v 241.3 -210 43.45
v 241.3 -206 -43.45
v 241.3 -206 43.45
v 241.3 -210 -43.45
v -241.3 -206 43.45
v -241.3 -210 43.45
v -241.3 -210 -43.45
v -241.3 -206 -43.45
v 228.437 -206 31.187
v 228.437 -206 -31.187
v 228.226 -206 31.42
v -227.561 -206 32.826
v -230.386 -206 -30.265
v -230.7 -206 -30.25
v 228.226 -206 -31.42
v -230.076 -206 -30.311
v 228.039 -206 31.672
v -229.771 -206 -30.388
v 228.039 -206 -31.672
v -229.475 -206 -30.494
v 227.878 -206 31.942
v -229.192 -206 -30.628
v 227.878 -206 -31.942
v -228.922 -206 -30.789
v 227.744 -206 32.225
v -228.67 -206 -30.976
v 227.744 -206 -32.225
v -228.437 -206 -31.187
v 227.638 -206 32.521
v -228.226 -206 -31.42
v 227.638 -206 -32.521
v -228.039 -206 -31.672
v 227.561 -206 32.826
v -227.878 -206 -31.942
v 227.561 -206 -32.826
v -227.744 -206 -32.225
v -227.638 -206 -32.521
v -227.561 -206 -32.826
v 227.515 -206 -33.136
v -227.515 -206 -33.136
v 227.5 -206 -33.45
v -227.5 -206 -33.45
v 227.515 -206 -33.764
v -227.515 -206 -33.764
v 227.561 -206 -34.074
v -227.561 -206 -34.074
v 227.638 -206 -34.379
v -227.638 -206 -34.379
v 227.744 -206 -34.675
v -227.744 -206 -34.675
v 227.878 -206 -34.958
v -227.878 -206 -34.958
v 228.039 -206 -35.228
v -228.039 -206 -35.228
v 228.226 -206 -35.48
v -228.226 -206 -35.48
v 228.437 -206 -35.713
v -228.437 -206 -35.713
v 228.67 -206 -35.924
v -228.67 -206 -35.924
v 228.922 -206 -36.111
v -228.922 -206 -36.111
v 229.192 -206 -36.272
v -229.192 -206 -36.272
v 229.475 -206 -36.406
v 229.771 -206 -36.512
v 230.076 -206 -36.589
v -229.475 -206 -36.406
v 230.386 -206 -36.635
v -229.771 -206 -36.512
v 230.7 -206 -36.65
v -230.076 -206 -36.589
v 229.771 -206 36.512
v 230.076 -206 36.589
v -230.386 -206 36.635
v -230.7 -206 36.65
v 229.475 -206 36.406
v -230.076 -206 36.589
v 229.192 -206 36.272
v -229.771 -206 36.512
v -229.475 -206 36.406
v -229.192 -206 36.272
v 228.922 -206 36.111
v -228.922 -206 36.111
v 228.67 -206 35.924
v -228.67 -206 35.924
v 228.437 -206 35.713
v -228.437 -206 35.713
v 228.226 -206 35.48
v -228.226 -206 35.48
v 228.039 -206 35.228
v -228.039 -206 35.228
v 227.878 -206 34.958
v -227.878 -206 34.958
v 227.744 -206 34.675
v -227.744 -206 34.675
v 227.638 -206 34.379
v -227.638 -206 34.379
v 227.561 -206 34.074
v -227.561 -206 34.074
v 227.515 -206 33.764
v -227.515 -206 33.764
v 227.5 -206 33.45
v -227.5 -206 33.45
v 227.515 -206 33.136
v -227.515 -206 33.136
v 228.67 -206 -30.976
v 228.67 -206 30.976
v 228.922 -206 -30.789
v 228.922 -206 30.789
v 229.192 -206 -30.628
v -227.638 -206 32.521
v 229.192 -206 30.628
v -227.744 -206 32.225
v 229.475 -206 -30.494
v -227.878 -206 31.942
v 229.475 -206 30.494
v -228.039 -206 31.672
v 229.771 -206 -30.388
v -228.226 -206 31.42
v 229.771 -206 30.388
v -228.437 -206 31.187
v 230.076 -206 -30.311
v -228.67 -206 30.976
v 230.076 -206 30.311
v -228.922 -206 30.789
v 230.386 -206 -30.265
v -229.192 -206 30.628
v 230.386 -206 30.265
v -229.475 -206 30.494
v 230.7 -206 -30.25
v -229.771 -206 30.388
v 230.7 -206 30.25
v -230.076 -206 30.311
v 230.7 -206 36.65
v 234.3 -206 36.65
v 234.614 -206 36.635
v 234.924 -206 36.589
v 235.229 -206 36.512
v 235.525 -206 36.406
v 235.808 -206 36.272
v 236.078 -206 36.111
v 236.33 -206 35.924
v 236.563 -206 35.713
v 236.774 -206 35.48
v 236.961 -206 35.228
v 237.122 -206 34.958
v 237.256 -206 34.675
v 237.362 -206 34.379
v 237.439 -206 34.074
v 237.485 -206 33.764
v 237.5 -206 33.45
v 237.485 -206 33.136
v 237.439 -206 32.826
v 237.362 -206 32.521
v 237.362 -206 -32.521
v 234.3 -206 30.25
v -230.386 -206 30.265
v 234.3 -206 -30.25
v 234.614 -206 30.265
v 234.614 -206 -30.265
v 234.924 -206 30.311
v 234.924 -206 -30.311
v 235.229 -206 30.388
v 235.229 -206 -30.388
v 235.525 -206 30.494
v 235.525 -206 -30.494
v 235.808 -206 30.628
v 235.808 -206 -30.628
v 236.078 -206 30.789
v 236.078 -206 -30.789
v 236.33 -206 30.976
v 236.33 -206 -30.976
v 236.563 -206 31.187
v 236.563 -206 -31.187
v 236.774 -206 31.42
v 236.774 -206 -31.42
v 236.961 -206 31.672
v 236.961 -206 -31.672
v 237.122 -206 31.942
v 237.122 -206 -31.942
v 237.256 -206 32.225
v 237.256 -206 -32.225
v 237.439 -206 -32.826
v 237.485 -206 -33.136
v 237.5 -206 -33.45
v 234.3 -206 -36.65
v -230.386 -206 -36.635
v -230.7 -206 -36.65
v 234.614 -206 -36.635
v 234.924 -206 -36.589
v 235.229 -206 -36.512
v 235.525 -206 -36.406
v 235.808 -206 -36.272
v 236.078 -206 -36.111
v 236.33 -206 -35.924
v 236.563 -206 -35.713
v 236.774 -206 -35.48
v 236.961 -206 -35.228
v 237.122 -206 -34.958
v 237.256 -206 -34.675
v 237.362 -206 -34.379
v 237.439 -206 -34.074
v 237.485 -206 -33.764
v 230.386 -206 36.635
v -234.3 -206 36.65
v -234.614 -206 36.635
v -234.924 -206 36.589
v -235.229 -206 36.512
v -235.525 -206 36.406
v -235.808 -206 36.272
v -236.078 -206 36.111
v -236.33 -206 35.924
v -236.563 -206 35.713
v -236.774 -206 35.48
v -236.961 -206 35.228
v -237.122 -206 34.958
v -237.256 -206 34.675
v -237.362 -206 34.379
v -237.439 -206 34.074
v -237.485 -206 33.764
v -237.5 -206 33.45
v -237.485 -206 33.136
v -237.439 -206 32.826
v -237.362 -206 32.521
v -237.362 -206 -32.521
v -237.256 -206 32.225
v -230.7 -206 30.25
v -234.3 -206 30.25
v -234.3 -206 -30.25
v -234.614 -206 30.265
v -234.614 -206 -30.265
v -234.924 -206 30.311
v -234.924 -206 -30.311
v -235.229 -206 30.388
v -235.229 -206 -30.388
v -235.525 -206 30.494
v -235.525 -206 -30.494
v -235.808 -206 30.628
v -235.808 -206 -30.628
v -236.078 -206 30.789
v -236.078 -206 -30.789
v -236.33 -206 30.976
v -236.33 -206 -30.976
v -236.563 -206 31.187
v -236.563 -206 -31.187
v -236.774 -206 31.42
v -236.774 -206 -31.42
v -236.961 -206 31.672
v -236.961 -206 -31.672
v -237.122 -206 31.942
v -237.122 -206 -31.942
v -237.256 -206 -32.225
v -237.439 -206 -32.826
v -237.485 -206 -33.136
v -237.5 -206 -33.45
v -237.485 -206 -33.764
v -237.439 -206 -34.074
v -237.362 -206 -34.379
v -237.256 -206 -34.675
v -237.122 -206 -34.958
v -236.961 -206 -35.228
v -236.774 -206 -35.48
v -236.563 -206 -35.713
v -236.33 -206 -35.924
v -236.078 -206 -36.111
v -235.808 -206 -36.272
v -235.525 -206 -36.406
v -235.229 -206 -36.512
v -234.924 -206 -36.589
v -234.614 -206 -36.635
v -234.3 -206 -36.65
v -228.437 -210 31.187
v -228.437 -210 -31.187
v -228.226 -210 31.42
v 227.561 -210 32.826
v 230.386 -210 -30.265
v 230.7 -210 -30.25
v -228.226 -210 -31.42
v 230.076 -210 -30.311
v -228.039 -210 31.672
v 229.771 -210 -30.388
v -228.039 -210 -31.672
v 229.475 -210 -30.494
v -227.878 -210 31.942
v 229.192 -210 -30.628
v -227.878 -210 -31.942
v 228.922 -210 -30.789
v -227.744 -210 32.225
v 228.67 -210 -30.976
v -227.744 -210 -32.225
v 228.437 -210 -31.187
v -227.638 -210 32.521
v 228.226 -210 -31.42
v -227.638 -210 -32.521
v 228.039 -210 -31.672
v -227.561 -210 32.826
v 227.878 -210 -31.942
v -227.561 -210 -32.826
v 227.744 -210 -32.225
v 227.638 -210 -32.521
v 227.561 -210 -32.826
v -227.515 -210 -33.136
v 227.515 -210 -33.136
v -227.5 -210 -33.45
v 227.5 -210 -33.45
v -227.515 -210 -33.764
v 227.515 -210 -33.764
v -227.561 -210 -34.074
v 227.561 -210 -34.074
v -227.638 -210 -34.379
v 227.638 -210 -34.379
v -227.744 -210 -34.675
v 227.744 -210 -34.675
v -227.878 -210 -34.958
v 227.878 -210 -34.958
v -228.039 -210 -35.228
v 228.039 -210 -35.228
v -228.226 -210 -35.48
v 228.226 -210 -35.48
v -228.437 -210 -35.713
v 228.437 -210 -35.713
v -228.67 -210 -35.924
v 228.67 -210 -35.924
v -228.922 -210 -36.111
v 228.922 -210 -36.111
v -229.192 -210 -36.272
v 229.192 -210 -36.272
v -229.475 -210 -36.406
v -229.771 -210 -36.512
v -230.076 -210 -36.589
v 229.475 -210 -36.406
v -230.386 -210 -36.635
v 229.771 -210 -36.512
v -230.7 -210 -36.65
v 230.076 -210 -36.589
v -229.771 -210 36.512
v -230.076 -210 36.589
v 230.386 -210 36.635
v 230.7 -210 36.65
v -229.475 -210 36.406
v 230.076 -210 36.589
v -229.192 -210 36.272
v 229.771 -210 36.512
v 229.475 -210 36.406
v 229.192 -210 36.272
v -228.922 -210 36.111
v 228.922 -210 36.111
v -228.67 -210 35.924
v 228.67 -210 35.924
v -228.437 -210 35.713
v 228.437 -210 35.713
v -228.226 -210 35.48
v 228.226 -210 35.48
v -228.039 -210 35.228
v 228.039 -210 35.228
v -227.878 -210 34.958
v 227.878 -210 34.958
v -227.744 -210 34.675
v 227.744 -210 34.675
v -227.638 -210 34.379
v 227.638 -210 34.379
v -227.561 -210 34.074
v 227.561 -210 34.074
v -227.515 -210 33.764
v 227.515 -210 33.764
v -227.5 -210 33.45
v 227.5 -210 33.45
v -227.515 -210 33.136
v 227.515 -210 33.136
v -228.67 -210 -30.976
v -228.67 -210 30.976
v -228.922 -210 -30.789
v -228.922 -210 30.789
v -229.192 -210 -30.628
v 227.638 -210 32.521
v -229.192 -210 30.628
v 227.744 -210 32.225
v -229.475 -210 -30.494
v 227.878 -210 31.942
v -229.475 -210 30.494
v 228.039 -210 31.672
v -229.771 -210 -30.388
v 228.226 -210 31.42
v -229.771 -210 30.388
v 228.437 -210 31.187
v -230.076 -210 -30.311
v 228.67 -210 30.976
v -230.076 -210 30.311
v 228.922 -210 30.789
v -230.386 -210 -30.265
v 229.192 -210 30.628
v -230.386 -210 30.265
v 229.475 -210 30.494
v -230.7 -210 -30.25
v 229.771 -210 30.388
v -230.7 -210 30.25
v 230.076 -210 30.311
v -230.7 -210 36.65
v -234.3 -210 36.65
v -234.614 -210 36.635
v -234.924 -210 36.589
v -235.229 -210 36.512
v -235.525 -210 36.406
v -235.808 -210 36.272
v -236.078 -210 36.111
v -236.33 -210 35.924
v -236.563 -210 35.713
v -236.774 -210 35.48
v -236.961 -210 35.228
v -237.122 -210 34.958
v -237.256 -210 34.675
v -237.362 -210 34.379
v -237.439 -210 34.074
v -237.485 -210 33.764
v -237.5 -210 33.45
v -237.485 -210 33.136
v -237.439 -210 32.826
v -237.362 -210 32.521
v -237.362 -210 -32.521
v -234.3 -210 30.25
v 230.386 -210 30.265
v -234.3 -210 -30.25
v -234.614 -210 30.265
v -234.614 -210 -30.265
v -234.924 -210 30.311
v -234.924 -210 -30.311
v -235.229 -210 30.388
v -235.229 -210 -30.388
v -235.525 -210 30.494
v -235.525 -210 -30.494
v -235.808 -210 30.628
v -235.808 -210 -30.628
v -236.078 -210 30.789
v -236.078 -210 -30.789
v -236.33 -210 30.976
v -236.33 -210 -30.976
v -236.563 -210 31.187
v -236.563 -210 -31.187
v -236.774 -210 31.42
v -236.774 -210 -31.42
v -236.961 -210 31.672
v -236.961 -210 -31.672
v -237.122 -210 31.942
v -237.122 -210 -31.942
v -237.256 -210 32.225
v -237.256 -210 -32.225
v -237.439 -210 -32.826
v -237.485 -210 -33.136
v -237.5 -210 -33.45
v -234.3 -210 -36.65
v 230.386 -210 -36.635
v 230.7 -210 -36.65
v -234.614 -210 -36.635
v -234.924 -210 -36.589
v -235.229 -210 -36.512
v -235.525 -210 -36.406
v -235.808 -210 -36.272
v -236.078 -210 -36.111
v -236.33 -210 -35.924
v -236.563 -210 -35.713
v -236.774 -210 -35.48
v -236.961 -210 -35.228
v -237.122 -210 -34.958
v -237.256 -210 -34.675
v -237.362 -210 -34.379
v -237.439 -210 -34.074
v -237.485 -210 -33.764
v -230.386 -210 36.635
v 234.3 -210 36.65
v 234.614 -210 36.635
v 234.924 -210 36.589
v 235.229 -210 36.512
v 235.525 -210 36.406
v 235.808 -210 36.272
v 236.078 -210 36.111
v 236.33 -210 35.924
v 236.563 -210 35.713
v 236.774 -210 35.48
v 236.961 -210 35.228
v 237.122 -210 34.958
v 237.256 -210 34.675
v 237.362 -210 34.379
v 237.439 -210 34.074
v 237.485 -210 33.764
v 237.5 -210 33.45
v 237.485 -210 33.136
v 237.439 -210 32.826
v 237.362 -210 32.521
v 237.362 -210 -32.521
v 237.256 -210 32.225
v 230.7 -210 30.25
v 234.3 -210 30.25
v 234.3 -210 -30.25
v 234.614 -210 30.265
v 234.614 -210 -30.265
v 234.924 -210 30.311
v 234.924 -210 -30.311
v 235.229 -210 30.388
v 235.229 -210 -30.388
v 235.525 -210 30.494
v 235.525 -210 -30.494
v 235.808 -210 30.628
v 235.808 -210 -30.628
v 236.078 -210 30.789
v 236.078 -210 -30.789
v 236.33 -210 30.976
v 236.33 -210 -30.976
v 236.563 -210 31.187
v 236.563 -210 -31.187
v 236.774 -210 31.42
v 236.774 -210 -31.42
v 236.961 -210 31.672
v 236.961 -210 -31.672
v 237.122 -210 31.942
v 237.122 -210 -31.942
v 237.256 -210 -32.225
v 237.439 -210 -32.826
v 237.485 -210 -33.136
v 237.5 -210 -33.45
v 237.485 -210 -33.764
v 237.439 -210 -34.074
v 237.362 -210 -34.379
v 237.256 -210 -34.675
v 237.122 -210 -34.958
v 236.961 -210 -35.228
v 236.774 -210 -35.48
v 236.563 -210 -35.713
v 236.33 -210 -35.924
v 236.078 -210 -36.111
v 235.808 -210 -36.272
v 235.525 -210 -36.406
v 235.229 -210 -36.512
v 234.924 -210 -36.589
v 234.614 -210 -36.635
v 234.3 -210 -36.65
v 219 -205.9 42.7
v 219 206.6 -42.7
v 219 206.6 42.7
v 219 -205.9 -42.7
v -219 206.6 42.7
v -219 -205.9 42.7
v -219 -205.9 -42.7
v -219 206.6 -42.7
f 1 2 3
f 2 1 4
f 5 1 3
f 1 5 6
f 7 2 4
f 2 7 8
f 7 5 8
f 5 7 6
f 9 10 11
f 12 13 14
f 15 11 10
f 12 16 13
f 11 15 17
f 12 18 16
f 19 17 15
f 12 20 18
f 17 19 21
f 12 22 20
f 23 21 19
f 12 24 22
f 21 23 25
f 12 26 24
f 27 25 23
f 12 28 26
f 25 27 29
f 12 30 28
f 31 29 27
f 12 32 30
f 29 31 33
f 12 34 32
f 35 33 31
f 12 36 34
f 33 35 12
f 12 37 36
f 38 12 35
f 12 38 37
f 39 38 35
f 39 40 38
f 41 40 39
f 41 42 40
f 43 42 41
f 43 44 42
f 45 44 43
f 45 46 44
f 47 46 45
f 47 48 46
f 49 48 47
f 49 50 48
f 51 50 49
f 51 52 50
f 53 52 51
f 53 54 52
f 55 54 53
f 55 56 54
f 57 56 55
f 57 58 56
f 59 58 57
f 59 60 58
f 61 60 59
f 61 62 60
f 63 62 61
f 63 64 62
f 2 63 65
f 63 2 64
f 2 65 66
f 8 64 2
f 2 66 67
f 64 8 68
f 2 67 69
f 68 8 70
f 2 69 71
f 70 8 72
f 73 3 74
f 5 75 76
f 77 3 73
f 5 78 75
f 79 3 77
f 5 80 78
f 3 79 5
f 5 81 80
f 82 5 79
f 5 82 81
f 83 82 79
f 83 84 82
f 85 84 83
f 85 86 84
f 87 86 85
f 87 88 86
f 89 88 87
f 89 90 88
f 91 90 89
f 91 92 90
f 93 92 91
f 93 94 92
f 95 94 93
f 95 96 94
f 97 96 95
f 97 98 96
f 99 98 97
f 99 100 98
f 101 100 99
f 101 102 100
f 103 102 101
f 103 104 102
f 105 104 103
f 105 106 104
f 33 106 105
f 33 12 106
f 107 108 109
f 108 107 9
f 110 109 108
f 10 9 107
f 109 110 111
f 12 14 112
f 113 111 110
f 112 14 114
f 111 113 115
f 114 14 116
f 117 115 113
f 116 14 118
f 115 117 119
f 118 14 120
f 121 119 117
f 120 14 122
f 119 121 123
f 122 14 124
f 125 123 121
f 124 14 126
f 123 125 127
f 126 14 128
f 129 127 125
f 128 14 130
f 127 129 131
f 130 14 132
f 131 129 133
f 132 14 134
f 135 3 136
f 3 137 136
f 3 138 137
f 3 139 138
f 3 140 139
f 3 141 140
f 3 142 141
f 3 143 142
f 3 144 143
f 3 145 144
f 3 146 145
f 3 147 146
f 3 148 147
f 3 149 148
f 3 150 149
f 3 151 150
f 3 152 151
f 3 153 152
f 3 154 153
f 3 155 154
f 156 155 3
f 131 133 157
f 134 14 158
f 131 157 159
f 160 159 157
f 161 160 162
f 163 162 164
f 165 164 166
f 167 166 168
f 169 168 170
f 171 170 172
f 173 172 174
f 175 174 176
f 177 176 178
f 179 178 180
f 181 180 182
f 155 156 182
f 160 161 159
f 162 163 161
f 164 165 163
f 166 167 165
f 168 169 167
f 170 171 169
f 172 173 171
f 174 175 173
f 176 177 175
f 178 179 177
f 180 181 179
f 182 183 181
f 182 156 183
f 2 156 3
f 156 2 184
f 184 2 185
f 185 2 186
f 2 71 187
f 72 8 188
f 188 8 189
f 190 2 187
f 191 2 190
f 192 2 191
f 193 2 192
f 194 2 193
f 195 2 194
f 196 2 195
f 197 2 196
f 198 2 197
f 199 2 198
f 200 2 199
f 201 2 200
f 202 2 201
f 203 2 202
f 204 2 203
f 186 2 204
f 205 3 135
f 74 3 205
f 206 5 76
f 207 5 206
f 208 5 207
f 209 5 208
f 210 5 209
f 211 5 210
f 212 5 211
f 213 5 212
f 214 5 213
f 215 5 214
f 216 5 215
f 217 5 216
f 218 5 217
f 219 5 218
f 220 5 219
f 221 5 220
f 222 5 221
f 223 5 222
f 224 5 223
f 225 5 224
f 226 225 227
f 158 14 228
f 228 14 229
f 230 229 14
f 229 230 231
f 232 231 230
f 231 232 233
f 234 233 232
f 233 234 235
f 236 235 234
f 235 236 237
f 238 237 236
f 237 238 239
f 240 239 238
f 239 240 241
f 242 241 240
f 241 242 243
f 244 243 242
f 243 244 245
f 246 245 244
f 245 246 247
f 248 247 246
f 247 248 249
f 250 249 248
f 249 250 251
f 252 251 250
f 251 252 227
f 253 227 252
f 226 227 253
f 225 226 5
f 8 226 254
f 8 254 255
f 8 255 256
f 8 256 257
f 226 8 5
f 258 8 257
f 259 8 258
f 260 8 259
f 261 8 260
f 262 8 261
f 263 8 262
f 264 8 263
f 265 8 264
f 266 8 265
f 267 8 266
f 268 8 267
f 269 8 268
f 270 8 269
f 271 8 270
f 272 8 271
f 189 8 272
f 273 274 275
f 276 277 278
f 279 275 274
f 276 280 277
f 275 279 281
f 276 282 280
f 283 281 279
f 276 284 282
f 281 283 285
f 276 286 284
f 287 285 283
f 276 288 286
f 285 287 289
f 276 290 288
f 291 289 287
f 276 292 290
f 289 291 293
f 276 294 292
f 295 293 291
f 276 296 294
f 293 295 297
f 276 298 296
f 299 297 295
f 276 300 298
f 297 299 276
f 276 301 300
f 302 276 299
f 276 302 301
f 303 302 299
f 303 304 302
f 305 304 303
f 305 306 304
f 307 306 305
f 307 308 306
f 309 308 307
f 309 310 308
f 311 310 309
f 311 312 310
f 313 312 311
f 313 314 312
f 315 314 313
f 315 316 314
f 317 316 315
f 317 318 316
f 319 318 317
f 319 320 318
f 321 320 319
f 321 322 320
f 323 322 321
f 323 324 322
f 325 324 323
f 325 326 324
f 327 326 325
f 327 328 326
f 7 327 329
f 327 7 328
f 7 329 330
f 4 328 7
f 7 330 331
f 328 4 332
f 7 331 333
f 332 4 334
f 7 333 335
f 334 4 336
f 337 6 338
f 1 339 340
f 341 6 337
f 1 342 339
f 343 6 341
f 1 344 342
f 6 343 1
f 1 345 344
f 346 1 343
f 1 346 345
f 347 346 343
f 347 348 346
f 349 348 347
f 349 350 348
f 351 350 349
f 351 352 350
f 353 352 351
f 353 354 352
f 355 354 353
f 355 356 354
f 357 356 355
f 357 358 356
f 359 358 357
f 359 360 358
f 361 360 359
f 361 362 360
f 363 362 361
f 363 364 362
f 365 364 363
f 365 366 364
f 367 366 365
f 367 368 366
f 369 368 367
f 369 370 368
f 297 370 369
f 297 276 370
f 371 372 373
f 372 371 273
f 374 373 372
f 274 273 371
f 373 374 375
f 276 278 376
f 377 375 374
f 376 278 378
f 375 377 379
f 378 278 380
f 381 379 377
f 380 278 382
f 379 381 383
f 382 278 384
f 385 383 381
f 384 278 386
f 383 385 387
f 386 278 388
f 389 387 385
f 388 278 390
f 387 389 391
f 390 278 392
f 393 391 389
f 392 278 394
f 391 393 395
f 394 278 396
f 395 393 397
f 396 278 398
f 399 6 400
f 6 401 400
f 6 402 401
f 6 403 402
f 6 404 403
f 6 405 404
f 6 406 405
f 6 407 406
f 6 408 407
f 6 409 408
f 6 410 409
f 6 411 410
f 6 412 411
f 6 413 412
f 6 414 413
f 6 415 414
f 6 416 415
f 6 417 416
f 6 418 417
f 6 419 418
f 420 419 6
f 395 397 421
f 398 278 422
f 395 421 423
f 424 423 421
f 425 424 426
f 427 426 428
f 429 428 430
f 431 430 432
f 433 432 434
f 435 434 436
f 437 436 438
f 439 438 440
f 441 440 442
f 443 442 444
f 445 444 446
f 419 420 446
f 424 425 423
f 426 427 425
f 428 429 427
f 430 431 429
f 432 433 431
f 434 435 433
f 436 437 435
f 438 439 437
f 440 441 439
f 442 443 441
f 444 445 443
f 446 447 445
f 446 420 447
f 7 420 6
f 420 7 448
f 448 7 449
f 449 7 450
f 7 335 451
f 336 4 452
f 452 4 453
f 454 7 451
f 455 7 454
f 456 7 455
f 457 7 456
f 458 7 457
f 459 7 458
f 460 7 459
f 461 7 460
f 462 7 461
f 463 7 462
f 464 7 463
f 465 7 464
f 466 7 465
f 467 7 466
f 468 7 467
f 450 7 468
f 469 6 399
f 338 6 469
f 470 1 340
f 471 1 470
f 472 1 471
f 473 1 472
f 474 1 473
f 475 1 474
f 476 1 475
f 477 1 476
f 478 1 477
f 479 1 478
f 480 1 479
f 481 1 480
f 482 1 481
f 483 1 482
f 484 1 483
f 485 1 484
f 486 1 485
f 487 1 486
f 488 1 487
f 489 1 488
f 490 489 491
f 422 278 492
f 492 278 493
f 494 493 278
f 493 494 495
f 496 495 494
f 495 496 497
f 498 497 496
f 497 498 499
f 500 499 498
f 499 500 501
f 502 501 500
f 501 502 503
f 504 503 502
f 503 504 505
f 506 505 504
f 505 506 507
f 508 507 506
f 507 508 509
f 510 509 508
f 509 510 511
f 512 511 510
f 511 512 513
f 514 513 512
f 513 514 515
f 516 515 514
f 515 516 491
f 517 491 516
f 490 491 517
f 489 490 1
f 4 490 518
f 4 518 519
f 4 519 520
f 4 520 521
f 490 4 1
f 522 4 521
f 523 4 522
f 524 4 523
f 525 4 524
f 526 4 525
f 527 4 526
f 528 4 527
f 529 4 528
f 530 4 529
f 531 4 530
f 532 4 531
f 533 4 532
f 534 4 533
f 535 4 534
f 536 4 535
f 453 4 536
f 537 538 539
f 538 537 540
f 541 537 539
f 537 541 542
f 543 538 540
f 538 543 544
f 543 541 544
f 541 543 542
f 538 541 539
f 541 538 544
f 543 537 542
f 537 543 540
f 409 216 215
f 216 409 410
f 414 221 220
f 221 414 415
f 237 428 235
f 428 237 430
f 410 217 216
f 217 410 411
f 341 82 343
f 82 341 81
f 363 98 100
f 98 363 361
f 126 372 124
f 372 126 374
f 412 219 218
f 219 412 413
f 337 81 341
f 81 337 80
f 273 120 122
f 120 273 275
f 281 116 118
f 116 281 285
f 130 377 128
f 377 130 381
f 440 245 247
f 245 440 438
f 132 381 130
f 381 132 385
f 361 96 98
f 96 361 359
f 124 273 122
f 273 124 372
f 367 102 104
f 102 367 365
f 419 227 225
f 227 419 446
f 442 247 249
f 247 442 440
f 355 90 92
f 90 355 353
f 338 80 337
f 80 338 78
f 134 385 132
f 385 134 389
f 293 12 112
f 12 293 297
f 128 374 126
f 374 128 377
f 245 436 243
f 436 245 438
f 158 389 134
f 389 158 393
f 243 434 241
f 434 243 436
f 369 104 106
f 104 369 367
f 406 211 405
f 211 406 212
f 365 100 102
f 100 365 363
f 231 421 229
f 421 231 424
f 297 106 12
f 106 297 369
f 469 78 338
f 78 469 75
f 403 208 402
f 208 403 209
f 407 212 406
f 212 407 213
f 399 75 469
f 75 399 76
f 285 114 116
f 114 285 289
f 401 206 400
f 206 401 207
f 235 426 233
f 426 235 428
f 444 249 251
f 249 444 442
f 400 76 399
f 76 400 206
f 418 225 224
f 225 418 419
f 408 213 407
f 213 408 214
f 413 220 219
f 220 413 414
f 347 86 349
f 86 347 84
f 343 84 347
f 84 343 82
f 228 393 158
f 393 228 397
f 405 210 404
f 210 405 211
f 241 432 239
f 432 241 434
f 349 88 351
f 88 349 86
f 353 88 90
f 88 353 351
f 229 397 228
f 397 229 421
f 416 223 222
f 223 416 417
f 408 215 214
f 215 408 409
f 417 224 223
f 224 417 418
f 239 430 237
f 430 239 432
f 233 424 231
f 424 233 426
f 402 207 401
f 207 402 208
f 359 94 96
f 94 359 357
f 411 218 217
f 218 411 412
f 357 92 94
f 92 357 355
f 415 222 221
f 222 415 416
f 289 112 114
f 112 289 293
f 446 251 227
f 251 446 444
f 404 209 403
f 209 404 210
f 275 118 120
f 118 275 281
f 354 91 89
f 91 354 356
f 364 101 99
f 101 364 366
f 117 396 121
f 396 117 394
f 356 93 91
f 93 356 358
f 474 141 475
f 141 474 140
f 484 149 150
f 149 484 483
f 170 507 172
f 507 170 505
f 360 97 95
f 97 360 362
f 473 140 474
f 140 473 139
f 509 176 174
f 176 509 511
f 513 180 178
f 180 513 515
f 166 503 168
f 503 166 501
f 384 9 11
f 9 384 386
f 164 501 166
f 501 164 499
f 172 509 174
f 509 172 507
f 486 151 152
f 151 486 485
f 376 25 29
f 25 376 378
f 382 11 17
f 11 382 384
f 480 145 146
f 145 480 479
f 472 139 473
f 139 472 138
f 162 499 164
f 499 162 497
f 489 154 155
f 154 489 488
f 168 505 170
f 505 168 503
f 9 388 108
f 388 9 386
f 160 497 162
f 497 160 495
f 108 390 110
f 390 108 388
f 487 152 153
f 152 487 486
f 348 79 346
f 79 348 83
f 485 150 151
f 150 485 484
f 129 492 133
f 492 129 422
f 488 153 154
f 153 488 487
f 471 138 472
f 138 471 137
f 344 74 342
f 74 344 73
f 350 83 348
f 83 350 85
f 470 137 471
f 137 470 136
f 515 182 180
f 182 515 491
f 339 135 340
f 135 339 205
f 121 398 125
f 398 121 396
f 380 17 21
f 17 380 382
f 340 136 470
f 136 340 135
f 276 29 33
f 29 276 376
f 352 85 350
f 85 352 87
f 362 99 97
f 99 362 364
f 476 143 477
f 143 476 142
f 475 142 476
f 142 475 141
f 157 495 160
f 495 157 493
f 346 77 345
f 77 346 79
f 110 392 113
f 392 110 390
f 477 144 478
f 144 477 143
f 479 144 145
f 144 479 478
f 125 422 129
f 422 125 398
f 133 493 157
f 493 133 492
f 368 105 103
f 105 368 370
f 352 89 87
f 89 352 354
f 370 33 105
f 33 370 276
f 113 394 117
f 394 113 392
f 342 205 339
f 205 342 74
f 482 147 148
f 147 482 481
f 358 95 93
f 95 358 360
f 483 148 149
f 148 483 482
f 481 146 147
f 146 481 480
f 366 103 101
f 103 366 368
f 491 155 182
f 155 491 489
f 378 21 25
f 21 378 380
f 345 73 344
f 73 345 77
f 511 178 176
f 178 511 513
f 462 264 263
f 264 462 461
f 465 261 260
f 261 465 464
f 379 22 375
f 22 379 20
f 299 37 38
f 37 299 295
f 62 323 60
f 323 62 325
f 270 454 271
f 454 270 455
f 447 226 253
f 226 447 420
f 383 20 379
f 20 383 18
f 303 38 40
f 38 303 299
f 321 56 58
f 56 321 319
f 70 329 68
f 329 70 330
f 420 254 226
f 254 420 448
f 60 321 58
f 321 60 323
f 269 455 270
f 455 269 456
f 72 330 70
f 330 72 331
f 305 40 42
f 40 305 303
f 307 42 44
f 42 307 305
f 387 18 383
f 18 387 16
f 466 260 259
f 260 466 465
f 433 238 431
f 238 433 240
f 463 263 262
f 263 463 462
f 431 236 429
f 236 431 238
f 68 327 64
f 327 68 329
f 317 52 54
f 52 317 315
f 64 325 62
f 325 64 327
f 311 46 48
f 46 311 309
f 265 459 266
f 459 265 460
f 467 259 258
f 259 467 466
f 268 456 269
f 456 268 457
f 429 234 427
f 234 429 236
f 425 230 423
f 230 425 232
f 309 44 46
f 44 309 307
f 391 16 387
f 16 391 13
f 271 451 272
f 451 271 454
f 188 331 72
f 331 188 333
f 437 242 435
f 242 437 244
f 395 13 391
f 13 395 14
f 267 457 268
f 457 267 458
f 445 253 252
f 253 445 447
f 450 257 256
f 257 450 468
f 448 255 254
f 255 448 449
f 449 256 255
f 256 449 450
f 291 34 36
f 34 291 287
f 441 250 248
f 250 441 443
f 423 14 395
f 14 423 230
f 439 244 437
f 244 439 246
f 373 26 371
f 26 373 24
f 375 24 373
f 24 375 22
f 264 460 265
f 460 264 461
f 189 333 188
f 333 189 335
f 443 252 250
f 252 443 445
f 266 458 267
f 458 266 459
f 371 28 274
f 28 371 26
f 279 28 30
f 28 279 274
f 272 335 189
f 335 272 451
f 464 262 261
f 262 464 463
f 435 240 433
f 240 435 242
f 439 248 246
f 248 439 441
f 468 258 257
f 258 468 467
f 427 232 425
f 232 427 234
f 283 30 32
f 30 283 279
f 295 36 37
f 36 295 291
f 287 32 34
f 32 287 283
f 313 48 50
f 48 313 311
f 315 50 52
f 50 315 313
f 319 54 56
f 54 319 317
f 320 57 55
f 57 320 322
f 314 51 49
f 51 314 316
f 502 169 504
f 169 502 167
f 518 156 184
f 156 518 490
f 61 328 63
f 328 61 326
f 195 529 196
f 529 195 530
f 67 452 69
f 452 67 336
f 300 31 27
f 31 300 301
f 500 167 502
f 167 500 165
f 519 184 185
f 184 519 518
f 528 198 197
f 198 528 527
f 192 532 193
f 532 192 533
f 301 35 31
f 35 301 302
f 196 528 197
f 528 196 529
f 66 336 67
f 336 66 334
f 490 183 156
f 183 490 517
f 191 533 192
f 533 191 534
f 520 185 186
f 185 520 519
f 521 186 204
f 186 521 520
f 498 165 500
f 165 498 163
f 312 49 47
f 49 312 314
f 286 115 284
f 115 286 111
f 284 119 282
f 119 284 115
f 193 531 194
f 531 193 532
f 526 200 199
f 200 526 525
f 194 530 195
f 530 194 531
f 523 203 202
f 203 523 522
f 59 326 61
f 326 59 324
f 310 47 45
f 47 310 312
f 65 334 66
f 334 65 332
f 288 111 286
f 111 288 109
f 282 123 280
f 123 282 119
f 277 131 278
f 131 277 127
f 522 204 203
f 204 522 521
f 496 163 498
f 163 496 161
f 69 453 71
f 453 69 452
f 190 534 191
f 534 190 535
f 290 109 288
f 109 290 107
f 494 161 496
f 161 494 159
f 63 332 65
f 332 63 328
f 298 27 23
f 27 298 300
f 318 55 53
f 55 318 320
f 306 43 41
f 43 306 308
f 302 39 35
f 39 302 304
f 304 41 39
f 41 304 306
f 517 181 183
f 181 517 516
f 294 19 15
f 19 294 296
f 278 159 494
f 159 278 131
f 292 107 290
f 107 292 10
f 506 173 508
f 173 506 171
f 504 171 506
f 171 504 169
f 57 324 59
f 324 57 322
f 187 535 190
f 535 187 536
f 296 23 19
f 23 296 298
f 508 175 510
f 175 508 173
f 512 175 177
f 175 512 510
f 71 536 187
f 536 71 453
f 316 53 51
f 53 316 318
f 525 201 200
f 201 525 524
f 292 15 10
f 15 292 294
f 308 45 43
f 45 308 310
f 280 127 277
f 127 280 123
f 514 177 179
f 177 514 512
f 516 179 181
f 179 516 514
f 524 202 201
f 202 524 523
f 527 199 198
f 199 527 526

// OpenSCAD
// ============================================================================
// Atom Lithography Machine — Parametric OpenSCAD Module (S3.2-06)
// ============================================================================
// part_id           : S3.2-06
// parent_bom_id     : S3.2
// subsystem         : S3
// part_name         : EMI kalkanli analog on-uc sasisi ve ultra-dusuk gurultulu lineer PSU
// material          : Al 6061
// temp_stage        : 300 K (kabin)
// vacuum_grade      : Atmosfer
// tolerance         : ±0.1%
// computed_mass_kg  : 9.56166
// envelope_mm       : 482.600 x 463.000 x 86.900
// design_maturity   : M0_M1_DETAILED_CAD_DESIGN_ONLY
// no_lab_measurement: true
// iec61508_certified: false
// semi_s2_certified : false
// Units: millimeters (mm)
// ============================================================================

$fn = 64;

// Nominal bounding envelope parameters (mm)
bbox_x = 482.6000;
bbox_y = 463.0000;
bbox_z = 86.9000;

// Part-specific parametric dimensions
n_psu_bays = 2;
rack_u_height = 2;
depth_mm = 420.0;

// Interface / port parameters (mm)

module part_S3_2_06() {
  difference() {
    union() {
      // 19-inch EIA-310 2U front faceplate (482.6 x 86.9 mm, facing -Y)
      translate([0.000, -208.000, 0.000]) cube([482.600, 4.000, 86.900], center=true);
      // Hollow EMI-shielded chassis body
      translate([0.000, 0.350, 0.000]) cube([438.000, 412.500, 85.400], center=true);
    }
    // EIA-310 upper-left rack ear slot
    translate([-232.500, -208.000, 33.450]) rotate([90.000, 0.000, 0.000]) {
      hull() {
        translate([-1.800, 0, 0]) cylinder(d=6.400, h=8.000, center=true);
        translate([1.800, 0, 0]) cylinder(d=6.400, h=8.000, center=true);
      }
    }
    // EIA-310 upper-right rack ear slot
    translate([232.500, -208.000, 33.450]) rotate([90.000, 0.000, 0.000]) {
      hull() {
        translate([-1.800, 0, 0]) cylinder(d=6.400, h=8.000, center=true);
        translate([1.800, 0, 0]) cylinder(d=6.400, h=8.000, center=true);
      }
    }
    // EIA-310 lower-left rack ear slot
    translate([-232.500, -208.000, -33.450]) rotate([90.000, 0.000, 0.000]) {
      hull() {
        translate([-1.800, 0, 0]) cylinder(d=6.400, h=8.000, center=true);
        translate([1.800, 0, 0]) cylinder(d=6.400, h=8.000, center=true);
      }
    }
    // EIA-310 lower-right rack ear slot
    translate([232.500, -208.000, -33.450]) rotate([90.000, 0.000, 0.000]) {
      hull() {
        translate([-1.800, 0, 0]) cylinder(d=6.400, h=8.000, center=true);
        translate([1.800, 0, 0]) cylinder(d=6.400, h=8.000, center=true);
      }
    }
  }
}

// World assembly mounting transform (global machine frame, mm / deg):
// translate([1480.000, -200.000, 390.100]) rotate([0.000, 0.000, 0.000]) part_S3_2_06();

part_S3_2_06();
